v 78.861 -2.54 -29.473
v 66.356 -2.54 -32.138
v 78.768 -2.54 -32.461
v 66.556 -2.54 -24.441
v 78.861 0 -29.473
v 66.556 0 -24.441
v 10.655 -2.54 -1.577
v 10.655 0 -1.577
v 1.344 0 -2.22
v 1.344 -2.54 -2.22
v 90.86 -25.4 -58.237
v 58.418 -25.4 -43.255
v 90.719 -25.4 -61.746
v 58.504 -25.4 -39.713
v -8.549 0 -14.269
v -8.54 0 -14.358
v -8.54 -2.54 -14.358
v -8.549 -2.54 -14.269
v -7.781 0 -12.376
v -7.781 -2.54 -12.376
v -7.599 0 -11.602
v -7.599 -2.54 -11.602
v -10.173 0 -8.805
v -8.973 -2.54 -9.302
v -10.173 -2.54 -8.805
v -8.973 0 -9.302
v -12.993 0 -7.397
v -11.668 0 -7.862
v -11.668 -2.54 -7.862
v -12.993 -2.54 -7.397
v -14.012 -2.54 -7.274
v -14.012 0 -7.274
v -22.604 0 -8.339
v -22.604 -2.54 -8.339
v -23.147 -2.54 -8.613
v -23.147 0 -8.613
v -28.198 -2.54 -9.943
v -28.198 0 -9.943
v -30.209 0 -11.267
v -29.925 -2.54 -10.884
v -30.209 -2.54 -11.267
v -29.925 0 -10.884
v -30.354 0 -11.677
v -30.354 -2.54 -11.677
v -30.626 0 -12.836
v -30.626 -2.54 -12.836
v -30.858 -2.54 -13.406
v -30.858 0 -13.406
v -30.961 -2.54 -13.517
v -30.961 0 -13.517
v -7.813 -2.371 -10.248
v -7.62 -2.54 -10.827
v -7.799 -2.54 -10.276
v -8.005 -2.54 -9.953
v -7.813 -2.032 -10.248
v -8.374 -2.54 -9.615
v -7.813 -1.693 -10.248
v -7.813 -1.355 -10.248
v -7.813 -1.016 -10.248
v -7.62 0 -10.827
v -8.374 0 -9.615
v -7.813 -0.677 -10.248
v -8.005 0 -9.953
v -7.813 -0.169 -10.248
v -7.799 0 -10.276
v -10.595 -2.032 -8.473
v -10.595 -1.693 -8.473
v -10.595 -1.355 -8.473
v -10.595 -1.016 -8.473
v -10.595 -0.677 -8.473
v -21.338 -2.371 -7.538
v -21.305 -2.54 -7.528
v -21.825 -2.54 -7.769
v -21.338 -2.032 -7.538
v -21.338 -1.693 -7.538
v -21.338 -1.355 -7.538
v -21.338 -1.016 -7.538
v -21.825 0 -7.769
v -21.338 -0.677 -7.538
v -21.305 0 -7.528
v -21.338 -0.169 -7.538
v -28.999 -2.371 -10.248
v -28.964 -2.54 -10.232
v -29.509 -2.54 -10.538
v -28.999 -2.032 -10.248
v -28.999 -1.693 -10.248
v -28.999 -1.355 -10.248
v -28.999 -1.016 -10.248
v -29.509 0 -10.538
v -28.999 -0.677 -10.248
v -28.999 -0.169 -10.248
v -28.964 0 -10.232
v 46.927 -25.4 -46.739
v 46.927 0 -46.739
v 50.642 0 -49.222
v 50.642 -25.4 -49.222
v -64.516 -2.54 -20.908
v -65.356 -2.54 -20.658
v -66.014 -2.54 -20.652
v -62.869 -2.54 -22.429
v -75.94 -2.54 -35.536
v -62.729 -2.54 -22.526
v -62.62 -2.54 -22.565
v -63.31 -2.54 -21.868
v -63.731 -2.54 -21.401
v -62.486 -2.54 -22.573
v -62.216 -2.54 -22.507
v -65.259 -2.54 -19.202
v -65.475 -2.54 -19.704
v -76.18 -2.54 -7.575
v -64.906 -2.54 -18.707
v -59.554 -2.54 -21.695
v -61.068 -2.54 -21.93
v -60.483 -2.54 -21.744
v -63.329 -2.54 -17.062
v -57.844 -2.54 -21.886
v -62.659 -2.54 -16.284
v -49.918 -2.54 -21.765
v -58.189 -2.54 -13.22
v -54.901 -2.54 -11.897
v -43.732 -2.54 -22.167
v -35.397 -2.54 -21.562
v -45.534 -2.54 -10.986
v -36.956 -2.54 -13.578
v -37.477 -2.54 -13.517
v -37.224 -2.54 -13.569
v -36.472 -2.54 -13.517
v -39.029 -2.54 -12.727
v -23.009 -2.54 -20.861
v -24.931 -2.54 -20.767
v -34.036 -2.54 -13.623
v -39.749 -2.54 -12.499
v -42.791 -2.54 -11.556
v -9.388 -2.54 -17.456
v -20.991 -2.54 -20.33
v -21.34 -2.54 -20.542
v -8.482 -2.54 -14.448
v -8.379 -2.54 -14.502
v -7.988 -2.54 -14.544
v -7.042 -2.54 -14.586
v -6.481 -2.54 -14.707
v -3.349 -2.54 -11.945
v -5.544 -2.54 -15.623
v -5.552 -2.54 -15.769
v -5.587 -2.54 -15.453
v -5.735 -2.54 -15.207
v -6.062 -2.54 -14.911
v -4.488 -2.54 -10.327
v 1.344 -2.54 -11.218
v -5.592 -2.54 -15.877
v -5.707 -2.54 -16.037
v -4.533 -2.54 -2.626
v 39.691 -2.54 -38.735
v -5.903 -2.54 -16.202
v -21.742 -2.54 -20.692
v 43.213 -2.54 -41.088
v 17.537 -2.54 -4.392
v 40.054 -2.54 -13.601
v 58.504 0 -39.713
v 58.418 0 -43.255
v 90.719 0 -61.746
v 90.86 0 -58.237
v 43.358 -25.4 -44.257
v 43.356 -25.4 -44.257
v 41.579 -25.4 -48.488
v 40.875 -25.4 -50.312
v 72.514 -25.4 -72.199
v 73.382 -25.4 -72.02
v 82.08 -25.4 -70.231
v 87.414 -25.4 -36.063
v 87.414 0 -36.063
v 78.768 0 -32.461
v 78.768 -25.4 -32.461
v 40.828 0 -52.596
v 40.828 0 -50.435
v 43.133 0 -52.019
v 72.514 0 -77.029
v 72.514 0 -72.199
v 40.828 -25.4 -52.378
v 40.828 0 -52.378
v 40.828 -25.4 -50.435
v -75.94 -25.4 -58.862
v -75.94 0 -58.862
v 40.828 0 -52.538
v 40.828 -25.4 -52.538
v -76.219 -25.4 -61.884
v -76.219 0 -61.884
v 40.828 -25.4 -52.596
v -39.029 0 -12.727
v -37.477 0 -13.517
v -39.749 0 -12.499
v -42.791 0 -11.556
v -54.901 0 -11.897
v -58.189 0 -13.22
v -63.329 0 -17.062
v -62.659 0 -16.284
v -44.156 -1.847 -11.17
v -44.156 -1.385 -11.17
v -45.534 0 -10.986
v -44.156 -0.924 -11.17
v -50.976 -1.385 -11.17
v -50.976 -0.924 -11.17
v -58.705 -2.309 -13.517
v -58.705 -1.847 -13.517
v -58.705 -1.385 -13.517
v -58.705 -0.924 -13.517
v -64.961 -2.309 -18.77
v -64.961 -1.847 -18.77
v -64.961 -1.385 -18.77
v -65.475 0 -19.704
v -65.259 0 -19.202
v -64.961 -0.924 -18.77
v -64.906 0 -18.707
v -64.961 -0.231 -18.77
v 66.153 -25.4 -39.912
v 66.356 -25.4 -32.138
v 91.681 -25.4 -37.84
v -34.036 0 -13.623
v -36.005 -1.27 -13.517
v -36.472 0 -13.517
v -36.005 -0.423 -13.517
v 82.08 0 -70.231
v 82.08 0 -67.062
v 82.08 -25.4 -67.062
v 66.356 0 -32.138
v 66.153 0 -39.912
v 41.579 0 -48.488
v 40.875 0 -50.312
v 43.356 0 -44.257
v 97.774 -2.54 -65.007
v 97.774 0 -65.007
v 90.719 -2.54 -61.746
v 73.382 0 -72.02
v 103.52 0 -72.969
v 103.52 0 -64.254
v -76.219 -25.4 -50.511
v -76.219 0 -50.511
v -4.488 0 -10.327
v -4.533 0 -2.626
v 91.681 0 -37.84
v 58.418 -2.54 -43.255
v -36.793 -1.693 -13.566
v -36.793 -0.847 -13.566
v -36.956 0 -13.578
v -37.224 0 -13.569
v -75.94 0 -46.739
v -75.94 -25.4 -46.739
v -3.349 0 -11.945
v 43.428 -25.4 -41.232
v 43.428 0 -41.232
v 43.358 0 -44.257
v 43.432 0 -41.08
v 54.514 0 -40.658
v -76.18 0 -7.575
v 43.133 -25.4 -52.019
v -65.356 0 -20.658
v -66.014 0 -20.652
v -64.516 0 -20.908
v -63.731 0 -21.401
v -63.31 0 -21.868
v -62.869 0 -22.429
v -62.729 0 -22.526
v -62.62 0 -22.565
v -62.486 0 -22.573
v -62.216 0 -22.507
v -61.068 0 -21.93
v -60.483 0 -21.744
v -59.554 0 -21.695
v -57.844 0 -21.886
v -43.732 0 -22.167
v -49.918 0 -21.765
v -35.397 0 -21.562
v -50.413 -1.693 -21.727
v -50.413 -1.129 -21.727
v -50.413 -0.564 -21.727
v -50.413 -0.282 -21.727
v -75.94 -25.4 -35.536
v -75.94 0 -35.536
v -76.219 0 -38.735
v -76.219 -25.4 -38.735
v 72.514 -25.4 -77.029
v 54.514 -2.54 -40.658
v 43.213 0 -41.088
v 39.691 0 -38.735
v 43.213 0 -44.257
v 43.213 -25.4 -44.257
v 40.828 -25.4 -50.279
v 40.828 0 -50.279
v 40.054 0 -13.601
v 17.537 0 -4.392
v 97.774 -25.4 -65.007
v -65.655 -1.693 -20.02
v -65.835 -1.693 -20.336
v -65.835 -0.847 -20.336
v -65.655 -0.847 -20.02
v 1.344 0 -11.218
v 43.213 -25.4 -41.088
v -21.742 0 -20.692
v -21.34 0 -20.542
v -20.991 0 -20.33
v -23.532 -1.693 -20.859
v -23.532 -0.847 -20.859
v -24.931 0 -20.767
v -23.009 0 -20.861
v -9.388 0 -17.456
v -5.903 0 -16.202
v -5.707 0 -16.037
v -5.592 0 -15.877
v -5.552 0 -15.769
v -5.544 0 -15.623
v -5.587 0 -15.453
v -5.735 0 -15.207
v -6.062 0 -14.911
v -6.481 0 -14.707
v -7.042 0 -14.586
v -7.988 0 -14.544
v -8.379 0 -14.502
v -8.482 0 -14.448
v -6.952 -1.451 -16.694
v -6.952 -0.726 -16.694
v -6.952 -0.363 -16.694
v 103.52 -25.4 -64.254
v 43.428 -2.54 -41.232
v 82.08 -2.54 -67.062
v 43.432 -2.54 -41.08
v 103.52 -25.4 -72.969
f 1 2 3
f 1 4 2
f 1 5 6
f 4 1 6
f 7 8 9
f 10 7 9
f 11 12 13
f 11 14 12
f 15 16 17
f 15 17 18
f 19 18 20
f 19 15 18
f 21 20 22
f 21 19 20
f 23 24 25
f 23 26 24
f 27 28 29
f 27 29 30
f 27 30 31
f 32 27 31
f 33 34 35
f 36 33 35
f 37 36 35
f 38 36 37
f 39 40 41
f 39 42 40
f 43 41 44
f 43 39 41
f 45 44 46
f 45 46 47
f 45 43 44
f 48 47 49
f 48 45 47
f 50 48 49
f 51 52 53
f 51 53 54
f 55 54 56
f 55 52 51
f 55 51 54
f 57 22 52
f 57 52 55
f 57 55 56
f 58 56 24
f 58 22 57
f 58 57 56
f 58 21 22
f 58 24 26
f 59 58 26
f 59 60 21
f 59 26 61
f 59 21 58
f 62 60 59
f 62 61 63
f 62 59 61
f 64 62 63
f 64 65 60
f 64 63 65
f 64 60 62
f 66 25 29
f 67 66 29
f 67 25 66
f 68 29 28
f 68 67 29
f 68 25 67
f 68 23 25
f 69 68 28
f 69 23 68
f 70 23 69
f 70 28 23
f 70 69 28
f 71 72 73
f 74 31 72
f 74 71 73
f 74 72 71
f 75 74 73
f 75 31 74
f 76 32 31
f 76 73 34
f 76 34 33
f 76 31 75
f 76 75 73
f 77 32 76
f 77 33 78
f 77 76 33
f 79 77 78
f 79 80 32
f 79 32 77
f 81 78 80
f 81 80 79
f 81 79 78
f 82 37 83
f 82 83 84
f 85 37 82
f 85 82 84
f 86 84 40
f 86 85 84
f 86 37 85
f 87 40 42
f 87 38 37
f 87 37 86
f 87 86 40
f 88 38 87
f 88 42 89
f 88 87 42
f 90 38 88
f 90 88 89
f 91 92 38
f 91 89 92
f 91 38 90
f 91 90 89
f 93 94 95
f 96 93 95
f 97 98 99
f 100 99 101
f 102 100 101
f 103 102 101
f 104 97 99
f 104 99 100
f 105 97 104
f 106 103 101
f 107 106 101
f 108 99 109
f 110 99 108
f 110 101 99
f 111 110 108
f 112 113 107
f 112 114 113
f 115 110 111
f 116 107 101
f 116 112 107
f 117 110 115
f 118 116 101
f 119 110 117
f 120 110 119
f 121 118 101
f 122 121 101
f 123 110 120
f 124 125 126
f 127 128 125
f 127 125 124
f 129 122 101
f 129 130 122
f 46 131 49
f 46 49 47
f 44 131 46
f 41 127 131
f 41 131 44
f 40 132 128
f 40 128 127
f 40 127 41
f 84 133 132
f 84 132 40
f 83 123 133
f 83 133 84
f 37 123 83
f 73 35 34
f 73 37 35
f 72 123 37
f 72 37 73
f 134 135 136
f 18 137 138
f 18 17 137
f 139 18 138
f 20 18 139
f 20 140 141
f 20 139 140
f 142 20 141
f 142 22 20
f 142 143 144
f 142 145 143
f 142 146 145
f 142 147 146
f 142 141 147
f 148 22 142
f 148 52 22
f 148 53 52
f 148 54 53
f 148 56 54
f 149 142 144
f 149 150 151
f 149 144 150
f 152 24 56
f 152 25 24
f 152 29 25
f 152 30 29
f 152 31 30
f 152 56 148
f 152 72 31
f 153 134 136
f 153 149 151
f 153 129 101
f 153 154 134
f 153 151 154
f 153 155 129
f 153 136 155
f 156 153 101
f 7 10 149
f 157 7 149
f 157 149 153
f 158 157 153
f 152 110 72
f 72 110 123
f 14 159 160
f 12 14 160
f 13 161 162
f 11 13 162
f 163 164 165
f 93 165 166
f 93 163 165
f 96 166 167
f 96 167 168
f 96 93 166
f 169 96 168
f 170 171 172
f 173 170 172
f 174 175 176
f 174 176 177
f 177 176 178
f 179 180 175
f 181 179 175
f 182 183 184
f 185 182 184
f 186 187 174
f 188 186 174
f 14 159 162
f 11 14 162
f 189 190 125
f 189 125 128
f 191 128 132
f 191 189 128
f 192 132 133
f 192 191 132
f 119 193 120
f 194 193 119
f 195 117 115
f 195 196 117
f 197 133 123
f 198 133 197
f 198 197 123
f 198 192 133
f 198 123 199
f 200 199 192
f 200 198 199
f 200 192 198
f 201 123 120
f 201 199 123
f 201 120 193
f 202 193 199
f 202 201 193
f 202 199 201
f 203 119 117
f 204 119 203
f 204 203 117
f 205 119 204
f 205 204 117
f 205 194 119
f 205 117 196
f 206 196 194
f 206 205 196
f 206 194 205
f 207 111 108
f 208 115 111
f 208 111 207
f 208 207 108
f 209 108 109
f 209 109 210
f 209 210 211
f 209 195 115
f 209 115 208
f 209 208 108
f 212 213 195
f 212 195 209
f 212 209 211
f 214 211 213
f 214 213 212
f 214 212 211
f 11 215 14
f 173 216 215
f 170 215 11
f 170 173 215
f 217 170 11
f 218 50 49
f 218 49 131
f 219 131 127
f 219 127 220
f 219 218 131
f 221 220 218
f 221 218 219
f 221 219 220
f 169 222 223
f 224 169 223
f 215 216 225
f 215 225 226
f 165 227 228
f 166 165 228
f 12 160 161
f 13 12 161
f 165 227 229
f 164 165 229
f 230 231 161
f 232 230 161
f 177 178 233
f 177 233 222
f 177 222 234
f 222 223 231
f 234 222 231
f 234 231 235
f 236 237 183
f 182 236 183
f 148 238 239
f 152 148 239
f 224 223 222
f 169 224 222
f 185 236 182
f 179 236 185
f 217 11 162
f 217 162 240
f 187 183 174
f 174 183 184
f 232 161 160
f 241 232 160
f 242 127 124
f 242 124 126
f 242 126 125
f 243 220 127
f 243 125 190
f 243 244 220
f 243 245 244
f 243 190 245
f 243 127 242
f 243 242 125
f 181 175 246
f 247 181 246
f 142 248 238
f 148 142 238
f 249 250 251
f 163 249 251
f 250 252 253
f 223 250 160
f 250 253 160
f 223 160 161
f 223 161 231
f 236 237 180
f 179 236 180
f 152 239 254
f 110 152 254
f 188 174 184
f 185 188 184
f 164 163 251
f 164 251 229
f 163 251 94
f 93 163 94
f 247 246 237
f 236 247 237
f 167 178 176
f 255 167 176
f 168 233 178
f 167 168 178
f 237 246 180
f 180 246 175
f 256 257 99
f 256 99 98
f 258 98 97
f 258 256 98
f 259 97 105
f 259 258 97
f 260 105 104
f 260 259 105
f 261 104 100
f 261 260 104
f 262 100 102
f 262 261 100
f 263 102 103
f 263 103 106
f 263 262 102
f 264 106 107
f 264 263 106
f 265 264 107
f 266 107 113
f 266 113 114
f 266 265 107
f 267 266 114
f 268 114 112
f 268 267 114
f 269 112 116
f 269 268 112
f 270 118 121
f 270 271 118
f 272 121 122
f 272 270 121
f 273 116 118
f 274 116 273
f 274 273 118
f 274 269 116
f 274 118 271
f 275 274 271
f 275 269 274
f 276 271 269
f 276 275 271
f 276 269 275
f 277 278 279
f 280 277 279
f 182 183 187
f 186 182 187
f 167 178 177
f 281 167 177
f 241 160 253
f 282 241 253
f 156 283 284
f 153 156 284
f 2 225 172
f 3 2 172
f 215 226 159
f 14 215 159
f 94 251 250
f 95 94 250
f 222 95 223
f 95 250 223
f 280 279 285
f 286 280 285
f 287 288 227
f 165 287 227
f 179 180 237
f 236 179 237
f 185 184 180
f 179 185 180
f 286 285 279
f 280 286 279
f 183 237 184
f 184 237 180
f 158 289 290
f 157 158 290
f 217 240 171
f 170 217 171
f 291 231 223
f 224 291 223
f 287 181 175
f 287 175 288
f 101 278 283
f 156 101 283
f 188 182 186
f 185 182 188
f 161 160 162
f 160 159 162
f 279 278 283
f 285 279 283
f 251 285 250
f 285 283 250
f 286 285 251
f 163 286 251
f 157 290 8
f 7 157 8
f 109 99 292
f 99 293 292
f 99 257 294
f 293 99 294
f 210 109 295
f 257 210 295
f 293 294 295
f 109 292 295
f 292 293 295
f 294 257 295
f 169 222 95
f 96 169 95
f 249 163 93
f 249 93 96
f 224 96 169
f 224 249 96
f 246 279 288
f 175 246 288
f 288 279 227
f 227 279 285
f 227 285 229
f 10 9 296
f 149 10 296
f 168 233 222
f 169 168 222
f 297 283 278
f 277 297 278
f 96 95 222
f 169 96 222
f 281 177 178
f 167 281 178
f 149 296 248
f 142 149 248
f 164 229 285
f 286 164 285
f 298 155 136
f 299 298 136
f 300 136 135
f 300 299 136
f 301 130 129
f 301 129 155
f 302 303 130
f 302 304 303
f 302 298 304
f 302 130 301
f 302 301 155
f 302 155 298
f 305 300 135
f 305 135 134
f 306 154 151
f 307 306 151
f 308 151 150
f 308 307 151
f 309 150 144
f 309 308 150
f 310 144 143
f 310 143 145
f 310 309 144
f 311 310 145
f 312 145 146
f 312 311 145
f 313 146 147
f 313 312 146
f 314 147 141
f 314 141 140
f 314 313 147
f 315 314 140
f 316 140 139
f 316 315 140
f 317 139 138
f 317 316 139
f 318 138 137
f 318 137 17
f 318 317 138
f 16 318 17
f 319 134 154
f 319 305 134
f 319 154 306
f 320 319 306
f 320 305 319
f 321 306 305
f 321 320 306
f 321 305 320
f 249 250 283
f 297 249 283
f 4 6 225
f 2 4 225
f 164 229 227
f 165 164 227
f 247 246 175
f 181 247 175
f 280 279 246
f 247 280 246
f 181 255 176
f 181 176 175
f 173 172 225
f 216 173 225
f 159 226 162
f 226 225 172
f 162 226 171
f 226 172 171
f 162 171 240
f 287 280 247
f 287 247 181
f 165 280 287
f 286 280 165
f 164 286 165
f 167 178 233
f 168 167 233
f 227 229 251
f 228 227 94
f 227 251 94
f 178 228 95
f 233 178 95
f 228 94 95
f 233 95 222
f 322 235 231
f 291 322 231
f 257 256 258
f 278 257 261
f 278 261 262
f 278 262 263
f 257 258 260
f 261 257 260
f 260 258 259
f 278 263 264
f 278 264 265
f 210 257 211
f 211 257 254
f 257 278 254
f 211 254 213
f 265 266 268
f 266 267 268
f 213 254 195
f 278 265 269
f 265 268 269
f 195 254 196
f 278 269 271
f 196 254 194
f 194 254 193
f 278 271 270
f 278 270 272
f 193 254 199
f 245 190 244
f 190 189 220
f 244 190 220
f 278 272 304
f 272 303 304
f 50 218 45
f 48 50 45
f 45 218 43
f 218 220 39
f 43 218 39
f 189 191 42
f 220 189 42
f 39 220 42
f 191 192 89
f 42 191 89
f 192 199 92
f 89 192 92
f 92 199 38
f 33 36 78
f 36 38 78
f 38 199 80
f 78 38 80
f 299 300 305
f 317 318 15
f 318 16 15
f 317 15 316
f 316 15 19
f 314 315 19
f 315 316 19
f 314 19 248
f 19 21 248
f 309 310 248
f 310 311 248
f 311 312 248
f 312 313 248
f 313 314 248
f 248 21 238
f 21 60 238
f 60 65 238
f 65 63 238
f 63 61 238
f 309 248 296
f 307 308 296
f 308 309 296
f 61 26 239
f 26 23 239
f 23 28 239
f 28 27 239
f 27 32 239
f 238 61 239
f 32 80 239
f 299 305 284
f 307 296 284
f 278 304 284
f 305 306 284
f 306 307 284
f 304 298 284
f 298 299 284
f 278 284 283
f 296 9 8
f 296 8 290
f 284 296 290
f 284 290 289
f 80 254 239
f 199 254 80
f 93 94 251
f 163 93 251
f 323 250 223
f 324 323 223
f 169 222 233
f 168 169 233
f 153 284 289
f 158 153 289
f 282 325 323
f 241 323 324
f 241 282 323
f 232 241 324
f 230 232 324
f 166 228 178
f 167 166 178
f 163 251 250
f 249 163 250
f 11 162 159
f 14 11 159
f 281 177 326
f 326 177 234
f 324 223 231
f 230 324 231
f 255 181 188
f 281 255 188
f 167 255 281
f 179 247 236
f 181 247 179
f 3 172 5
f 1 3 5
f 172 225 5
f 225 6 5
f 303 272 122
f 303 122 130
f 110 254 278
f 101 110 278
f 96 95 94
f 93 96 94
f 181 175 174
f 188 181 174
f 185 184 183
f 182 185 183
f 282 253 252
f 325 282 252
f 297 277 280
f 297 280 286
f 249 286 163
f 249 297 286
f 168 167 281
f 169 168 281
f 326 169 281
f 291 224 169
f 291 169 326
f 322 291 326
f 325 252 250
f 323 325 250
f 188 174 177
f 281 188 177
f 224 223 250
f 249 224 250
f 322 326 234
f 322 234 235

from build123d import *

# Parameters (mm, degrees)
F2_DEPTH = 2.54
F3_DEPTH = 25.4
F4_DEPTH = 25.4
F5_DEPTH = 25.4
F6_DEPTH = 25.4
F7_DEPTH = 25.4
F8_DEPTH = 25.4
F9_DEPTH = 25.4


with BuildPart() as f2:
    # F1 (on Front) → F2 (new body)
    with BuildSketch(Plane.XZ):
        Polygon((-75.9395807981, -35.5362684962), (43.2126186788, -41.0881893211), (39.6913095639, -38.7350070814), (40.0536553935, -13.6012235172), (17.5370398812, -4.3918604475), (10.6546273111, -1.5769331278), (1.3436772861, -2.2200768364), (1.3436772861, -11.2180095166), (-3.3487246837, -11.9446478784), (-4.4877594337, -10.3271948174), (-4.5330250478, -2.6260036347), (-76.1799983317, -7.5749401003), align=None)
        with BuildLine():
            add(Edge.make_bspline(
                [(-66.0144165158, -20.6524990499), (-65.7447688221, -20.6362292817), (-65.0893175233, -20.5966812308), (-63.4011300364, -21.3880853714), (-62.7211117666, -23.1300616873), (-60.6563493888, -21.3008974775), (-57.5856960421, -22.1484542791), (-52.7200535467, -21.8399065527), (-50.3376359025, -21.5913797584), (-45.6421812362, -22.4859495763), (-38.5439520838, -21.9393578463), (-35.3969931602, -21.5618535876)],
                knots=[0, 0, 0, 0, 0.0162182121, 0.03942273, 0.059445562, 0.0835861488, 0.1144778568, 0.1522164501, 0.1785182165, 0.2154033297, 0.2710300921, 0.2710300921, 0.2710300921, 0.2710300921], degree=3))
            add(Edge.make_bspline(
                [(-66.0144165158, -20.6524990499), (-65.8346687754, -20.3363578767), (-65.654921035, -20.0202167034), (-65.4751732945, -19.7040755302)],
                knots=[0, 0, 0, 0, 1.0910043192, 1.0910043192, 1.0910043192, 1.0910043192], degree=3))
            add(Edge.make_bspline(
                [(-37.4765023589, -13.5172829032), (-37.9651500114, -13.3724704926), (-39.0910887848, -12.521418484), (-40.7148424551, -12.4241464161), (-44.1774993458, -10.8580960742), (-47.7469821934, -10.9955769984), (-50.9342916454, -11.0500276912), (-55.7879620791, -11.9755286432), (-58.5542548518, -13.3276716897), (-62.9442245613, -16.2124442833), (-63.5841784395, -17.6101363453), (-65.0523055179, -18.6936323968), (-65.3639227785, -19.3857793438), (-65.4751732945, -19.7040755302)],
                knots=[0.0499860107, 0.0499860107, 0.0499860107, 0.0499860107, 0.1165606817, 0.1804999277, 0.2761731991, 0.3702283148, 0.4605054966, 0.5688333557, 0.6610224539, 0.7722713424, 0.8346001177, 0.8993507591, 0.9508599689, 0.9508599689, 0.9508599689, 0.9508599689], degree=3))
            add(Edge.make_bspline(
                [(-36.4724472165, -13.5172829032), (-36.7910300454, -13.5716473828), (-37.1096128743, -13.6260118624), (-37.4765023589, -13.5172829032)],
                knots=[0, 0, 0, 0, 0.0499860107, 0.0499860107, 0.0499860107, 0.0499860107], degree=3))
            add(Edge.make_bspline(
                [(-30.9606529772, -13.5172829032), (-31.0879745562, -13.5627755579), (-31.9141861458, -13.6438669397), (-33.2897382857, -13.584429224), (-34.9613470136, -13.6698880256), (-35.9041004236, -13.5078065462), (-36.0034378015, -13.5206507187), (-36.2807973954, -13.5186590829), (-36.4724472165, -13.5172829032)],
                knots=[0.9073843052, 0.9073843052, 0.9073843052, 0.9073843052, 0.9232075265, 0.9442405282, 0.9671607119, 0.9829838985, 0.988242221, 1, 1, 1, 1], degree=3))
            add(Edge.make_bspline(
                [(-8.5397958755, -14.3580650911), (-8.637601772, -14.01768561), (-7.2778006188, -12.0780786534), (-7.7542537931, -9.4938009197), (-10.0462000987, -9.0330212983), (-10.5290707793, -8.4023002118), (-13.4096250382, -6.8993403789), (-16.6660760009, -7.7162362423), (-21.5345194114, -7.0534230417), (-22.5984108349, -8.7210362807), (-25.7191280706, -9.16512128), (-26.8737253757, -9.6156684928), (-29.0452531025, -10.0909884532), (-30.3859018922, -11.1874827895), (-30.3941837838, -12.3310298265), (-30.8529446387, -13.4231402736), (-30.9103371918, -13.4993048144), (-30.9606529772, -13.5172829032)],
                knots=[0.554476293, 0.554476293, 0.554476293, 0.554476293, 0.5810977929, 0.6076480968, 0.6317580763, 0.6471803733, 0.6762024306, 0.7090455826, 0.7454797624, 0.7683201585, 0.797619682, 0.8176840265, 0.8429492365, 0.8646483023, 0.8831415723, 0.9011311798, 0.9073843052, 0.9073843052, 0.9073843052, 0.9073843052], degree=3))
            add(Edge.make_bspline(
                [(-20.9912610222, -20.330348604), (-19.6872959585, -20.1059692944), (-16.0761265907, -19.3131081509), (-10.8467979722, -17.8492309133), (-7.2048022263, -16.868833743), (-5.1136117259, -15.9158271855), (-6.1682253657, -14.5632464267), (-7.7817523952, -14.5453076076), (-8.48767128, -14.5394666573), (-8.5397958755, -14.3580650911)],
                knots=[0.3733505427, 0.3733505427, 0.3733505427, 0.3733505427, 0.3990478297, 0.4431488427, 0.4771291925, 0.4994552547, 0.5178264553, 0.5402886523, 0.554476293, 0.554476293, 0.554476293, 0.554476293], degree=3))
            add(Edge.make_bspline(
                [(-24.9309411219, -20.7673563349), (-23.623529814, -20.8746017701), (-21.9089478749, -21.0359237512), (-20.9912610222, -20.330348604)],
                knots=[0.1592382066, 0.1592382066, 0.1592382066, 0.1592382066, 0.2594496968, 0.2594496968, 0.2594496968, 0.2594496968], degree=3))
            add(Edge.make_bspline(
                [(-35.3969931602, -21.5618535876), (-33.0182940399, -21.2765085705), (-29.8922232703, -20.7131202508), (-26.5163706359, -20.8328768709), (-24.9309411217, -20.7673563277)],
                knots=[0.2710300921, 0.2710300921, 0.2710300921, 0.2710300921, 0.3130768218, 0.3466520524, 0.3466520524, 0.3466520524, 0.3466520524], degree=3))
        make_face(mode=Mode.SUBTRACT)
    extrude(amount=F2_DEPTH)


with BuildPart() as f2b:
    # F1 (on Front) → F2, piece 2 (new body)
    with BuildSketch(Plane.XZ):
        Polygon((82.0796936751, -67.0618563889), (97.7742969991, -65.0066137313), (90.7190218569, -61.746429652), (58.4182813764, -43.2547181845), (54.5135065913, -40.6578034163), (43.4315963593, -41.0798497192), (43.4280598169, -41.2321619868), align=None)
    extrude(amount=F2_DEPTH)


with BuildPart() as f2c:
    # F1 (on Front) → F2, piece 3 (new body)
    with BuildSketch(Plane.XZ):
        Polygon((66.3556205179, -32.1383414705), (78.7682905793, -32.4610732496), (78.8606753134, -29.4734106984), (66.5557615891, -24.4406641931), align=None)
    extrude(amount=F2_DEPTH)


with BuildPart() as f3:
    # F1 (on Front) → F3 (new body)
    with BuildSketch(Plane.XZ):
        Polygon((90.8602854007, -58.2368624827), (91.6812624183, -37.8404182892), (87.4143689871, -36.0628962517), (78.7682905793, -32.4610732496), (66.3556205179, -32.1383414705), (66.153499105, -39.9121851788), (58.5038982693, -39.7132941043), align=None)
    extrude(amount=F3_DEPTH)


with BuildPart() as f4:
    # F1 (on Front) → F4 (new body)
    with BuildSketch(Plane.XZ):
        Polygon((-76.2194469571, -38.7350070815), (-75.9395807981, -46.7394799352), (40.8275795716, -50.4353190995), (40.8275795716, -50.2786114812), (41.5791692127, -48.4884053749), (43.3556044359, -44.2571267486), (43.2126186788, -44.2571267486), align=None)
    extrude(amount=F4_DEPTH)


with BuildPart() as f5:
    # F1 (on Front) → F5 (new body)
    with BuildSketch(Plane.XZ):
        Polygon((40.8753246491, -50.3116405101), (72.5144609455, -72.1989219612), (73.3824430708, -72.0203272423), (82.0796936751, -70.2307938163), (50.64182051, -49.2218331218), (46.9272195944, -46.7394799352), (43.3578230828, -44.2571267486), (43.3556044359, -44.2571267486), (41.5791692127, -48.4884053749), align=None)
    extrude(amount=F5_DEPTH)


with BuildPart() as f6:
    # F1 (on Front) → F6 (new body)
    with BuildSketch(Plane.XZ):
        Polygon((-75.9395807981, -58.8624589145), (40.8275795716, -52.5383734534), (40.8275795716, -52.3781898479), (-76.2194469571, -50.5108088255), align=None)
    extrude(amount=F6_DEPTH)


with BuildPart() as f7:
    # F1 (on Front) → F7 (new body)
    with BuildSketch(Plane.XZ):
        Polygon((-76.2194469571, -61.8839263917), (40.8275795716, -52.5959296441), (40.8275795716, -52.5383734534), (-75.9395807981, -58.8624589145), align=None)
    extrude(amount=F7_DEPTH)


with BuildPart() as f7b:
    # F1 (on Front) → F7, piece 2 (new body)
    with BuildSketch(Plane.XZ):
        Polygon((-75.9395807981, -46.7394799352), (-76.2194469571, -50.5108088255), (40.8275795716, -52.3781898479), (40.8275795716, -50.4353190995), align=None)
    extrude(amount=F7_DEPTH)


with BuildPart() as f7c:
    # F1 (on Front) → F7, piece 3 (new body)
    with BuildSketch(Plane.XZ):
        Polygon((43.3578230828, -44.2571267486), (43.4280598169, -41.2321619868), (43.2126186788, -41.0881893211), (-75.9395807981, -35.5362684962), (-76.2194469571, -38.7350070815), (43.2126186788, -44.2571267486), (43.3556044359, -44.2571267486), align=None)
    extrude(amount=F7_DEPTH)


with BuildPart() as f8:
    # F1 (on Front) → F8 (new body)
    with BuildSketch(Plane.XZ):
        Polygon((40.8275795716, -52.5959296441), (72.5144609455, -77.0287681371), (72.5144609455, -73.0264203811), (72.5144609455, -72.1989219612), (43.1330775626, -52.0188117153), (40.8275795716, -50.4353190995), (40.8275795716, -52.3781898479), (40.8275795716, -52.5383734534), align=None)
    extrude(amount=F8_DEPTH)


with BuildPart() as f8b:
    # F1 (on Front) → F8, piece 2 (new body)
    with BuildSketch(Plane.XZ):
        Polygon((82.0796936751, -70.2307938163), (82.0796936751, -67.0618563889), (43.4280598169, -41.2321619868), (43.3578230828, -44.2571267486), (46.9272195944, -46.7394799352), (50.64182051, -49.2218331218), align=None)
    extrude(amount=F8_DEPTH)


with BuildPart() as f8c:
    # F1 (on Front) → F8, piece 3 (new body)
    with BuildSketch(Plane.XZ):
        Polygon((58.4182813764, -43.2547181845), (90.7190218569, -61.746429652), (90.8602854007, -58.2368624827), (58.5038982693, -39.7132941043), align=None)
    extrude(amount=F8_DEPTH)


with BuildPart() as f9:
    # F1 (on Front) → F9 (new body)
    with BuildSketch(Plane.XZ):
        Polygon((72.5144609455, -73.0264203811), (72.5144609455, -77.0287681371), (103.5198234022, -72.9685480588), (103.5198234022, -70.2307938163), (103.5198234022, -64.2542244729), (97.7742969991, -65.0066137313), (82.0796936751, -67.0618563889), (82.0796936751, -70.2307938163), (73.3824430708, -72.0203272423), (72.5144609455, -72.1989219612), align=None)
    extrude(amount=F9_DEPTH)


solid = Compound([f2.part, f2b.part, f2c.part, f3.part, f4.part, f5.part, f6.part, f7.part, f7b.part, f7c.part, f8.part, f8b.part, f8c.part, f9.part])
